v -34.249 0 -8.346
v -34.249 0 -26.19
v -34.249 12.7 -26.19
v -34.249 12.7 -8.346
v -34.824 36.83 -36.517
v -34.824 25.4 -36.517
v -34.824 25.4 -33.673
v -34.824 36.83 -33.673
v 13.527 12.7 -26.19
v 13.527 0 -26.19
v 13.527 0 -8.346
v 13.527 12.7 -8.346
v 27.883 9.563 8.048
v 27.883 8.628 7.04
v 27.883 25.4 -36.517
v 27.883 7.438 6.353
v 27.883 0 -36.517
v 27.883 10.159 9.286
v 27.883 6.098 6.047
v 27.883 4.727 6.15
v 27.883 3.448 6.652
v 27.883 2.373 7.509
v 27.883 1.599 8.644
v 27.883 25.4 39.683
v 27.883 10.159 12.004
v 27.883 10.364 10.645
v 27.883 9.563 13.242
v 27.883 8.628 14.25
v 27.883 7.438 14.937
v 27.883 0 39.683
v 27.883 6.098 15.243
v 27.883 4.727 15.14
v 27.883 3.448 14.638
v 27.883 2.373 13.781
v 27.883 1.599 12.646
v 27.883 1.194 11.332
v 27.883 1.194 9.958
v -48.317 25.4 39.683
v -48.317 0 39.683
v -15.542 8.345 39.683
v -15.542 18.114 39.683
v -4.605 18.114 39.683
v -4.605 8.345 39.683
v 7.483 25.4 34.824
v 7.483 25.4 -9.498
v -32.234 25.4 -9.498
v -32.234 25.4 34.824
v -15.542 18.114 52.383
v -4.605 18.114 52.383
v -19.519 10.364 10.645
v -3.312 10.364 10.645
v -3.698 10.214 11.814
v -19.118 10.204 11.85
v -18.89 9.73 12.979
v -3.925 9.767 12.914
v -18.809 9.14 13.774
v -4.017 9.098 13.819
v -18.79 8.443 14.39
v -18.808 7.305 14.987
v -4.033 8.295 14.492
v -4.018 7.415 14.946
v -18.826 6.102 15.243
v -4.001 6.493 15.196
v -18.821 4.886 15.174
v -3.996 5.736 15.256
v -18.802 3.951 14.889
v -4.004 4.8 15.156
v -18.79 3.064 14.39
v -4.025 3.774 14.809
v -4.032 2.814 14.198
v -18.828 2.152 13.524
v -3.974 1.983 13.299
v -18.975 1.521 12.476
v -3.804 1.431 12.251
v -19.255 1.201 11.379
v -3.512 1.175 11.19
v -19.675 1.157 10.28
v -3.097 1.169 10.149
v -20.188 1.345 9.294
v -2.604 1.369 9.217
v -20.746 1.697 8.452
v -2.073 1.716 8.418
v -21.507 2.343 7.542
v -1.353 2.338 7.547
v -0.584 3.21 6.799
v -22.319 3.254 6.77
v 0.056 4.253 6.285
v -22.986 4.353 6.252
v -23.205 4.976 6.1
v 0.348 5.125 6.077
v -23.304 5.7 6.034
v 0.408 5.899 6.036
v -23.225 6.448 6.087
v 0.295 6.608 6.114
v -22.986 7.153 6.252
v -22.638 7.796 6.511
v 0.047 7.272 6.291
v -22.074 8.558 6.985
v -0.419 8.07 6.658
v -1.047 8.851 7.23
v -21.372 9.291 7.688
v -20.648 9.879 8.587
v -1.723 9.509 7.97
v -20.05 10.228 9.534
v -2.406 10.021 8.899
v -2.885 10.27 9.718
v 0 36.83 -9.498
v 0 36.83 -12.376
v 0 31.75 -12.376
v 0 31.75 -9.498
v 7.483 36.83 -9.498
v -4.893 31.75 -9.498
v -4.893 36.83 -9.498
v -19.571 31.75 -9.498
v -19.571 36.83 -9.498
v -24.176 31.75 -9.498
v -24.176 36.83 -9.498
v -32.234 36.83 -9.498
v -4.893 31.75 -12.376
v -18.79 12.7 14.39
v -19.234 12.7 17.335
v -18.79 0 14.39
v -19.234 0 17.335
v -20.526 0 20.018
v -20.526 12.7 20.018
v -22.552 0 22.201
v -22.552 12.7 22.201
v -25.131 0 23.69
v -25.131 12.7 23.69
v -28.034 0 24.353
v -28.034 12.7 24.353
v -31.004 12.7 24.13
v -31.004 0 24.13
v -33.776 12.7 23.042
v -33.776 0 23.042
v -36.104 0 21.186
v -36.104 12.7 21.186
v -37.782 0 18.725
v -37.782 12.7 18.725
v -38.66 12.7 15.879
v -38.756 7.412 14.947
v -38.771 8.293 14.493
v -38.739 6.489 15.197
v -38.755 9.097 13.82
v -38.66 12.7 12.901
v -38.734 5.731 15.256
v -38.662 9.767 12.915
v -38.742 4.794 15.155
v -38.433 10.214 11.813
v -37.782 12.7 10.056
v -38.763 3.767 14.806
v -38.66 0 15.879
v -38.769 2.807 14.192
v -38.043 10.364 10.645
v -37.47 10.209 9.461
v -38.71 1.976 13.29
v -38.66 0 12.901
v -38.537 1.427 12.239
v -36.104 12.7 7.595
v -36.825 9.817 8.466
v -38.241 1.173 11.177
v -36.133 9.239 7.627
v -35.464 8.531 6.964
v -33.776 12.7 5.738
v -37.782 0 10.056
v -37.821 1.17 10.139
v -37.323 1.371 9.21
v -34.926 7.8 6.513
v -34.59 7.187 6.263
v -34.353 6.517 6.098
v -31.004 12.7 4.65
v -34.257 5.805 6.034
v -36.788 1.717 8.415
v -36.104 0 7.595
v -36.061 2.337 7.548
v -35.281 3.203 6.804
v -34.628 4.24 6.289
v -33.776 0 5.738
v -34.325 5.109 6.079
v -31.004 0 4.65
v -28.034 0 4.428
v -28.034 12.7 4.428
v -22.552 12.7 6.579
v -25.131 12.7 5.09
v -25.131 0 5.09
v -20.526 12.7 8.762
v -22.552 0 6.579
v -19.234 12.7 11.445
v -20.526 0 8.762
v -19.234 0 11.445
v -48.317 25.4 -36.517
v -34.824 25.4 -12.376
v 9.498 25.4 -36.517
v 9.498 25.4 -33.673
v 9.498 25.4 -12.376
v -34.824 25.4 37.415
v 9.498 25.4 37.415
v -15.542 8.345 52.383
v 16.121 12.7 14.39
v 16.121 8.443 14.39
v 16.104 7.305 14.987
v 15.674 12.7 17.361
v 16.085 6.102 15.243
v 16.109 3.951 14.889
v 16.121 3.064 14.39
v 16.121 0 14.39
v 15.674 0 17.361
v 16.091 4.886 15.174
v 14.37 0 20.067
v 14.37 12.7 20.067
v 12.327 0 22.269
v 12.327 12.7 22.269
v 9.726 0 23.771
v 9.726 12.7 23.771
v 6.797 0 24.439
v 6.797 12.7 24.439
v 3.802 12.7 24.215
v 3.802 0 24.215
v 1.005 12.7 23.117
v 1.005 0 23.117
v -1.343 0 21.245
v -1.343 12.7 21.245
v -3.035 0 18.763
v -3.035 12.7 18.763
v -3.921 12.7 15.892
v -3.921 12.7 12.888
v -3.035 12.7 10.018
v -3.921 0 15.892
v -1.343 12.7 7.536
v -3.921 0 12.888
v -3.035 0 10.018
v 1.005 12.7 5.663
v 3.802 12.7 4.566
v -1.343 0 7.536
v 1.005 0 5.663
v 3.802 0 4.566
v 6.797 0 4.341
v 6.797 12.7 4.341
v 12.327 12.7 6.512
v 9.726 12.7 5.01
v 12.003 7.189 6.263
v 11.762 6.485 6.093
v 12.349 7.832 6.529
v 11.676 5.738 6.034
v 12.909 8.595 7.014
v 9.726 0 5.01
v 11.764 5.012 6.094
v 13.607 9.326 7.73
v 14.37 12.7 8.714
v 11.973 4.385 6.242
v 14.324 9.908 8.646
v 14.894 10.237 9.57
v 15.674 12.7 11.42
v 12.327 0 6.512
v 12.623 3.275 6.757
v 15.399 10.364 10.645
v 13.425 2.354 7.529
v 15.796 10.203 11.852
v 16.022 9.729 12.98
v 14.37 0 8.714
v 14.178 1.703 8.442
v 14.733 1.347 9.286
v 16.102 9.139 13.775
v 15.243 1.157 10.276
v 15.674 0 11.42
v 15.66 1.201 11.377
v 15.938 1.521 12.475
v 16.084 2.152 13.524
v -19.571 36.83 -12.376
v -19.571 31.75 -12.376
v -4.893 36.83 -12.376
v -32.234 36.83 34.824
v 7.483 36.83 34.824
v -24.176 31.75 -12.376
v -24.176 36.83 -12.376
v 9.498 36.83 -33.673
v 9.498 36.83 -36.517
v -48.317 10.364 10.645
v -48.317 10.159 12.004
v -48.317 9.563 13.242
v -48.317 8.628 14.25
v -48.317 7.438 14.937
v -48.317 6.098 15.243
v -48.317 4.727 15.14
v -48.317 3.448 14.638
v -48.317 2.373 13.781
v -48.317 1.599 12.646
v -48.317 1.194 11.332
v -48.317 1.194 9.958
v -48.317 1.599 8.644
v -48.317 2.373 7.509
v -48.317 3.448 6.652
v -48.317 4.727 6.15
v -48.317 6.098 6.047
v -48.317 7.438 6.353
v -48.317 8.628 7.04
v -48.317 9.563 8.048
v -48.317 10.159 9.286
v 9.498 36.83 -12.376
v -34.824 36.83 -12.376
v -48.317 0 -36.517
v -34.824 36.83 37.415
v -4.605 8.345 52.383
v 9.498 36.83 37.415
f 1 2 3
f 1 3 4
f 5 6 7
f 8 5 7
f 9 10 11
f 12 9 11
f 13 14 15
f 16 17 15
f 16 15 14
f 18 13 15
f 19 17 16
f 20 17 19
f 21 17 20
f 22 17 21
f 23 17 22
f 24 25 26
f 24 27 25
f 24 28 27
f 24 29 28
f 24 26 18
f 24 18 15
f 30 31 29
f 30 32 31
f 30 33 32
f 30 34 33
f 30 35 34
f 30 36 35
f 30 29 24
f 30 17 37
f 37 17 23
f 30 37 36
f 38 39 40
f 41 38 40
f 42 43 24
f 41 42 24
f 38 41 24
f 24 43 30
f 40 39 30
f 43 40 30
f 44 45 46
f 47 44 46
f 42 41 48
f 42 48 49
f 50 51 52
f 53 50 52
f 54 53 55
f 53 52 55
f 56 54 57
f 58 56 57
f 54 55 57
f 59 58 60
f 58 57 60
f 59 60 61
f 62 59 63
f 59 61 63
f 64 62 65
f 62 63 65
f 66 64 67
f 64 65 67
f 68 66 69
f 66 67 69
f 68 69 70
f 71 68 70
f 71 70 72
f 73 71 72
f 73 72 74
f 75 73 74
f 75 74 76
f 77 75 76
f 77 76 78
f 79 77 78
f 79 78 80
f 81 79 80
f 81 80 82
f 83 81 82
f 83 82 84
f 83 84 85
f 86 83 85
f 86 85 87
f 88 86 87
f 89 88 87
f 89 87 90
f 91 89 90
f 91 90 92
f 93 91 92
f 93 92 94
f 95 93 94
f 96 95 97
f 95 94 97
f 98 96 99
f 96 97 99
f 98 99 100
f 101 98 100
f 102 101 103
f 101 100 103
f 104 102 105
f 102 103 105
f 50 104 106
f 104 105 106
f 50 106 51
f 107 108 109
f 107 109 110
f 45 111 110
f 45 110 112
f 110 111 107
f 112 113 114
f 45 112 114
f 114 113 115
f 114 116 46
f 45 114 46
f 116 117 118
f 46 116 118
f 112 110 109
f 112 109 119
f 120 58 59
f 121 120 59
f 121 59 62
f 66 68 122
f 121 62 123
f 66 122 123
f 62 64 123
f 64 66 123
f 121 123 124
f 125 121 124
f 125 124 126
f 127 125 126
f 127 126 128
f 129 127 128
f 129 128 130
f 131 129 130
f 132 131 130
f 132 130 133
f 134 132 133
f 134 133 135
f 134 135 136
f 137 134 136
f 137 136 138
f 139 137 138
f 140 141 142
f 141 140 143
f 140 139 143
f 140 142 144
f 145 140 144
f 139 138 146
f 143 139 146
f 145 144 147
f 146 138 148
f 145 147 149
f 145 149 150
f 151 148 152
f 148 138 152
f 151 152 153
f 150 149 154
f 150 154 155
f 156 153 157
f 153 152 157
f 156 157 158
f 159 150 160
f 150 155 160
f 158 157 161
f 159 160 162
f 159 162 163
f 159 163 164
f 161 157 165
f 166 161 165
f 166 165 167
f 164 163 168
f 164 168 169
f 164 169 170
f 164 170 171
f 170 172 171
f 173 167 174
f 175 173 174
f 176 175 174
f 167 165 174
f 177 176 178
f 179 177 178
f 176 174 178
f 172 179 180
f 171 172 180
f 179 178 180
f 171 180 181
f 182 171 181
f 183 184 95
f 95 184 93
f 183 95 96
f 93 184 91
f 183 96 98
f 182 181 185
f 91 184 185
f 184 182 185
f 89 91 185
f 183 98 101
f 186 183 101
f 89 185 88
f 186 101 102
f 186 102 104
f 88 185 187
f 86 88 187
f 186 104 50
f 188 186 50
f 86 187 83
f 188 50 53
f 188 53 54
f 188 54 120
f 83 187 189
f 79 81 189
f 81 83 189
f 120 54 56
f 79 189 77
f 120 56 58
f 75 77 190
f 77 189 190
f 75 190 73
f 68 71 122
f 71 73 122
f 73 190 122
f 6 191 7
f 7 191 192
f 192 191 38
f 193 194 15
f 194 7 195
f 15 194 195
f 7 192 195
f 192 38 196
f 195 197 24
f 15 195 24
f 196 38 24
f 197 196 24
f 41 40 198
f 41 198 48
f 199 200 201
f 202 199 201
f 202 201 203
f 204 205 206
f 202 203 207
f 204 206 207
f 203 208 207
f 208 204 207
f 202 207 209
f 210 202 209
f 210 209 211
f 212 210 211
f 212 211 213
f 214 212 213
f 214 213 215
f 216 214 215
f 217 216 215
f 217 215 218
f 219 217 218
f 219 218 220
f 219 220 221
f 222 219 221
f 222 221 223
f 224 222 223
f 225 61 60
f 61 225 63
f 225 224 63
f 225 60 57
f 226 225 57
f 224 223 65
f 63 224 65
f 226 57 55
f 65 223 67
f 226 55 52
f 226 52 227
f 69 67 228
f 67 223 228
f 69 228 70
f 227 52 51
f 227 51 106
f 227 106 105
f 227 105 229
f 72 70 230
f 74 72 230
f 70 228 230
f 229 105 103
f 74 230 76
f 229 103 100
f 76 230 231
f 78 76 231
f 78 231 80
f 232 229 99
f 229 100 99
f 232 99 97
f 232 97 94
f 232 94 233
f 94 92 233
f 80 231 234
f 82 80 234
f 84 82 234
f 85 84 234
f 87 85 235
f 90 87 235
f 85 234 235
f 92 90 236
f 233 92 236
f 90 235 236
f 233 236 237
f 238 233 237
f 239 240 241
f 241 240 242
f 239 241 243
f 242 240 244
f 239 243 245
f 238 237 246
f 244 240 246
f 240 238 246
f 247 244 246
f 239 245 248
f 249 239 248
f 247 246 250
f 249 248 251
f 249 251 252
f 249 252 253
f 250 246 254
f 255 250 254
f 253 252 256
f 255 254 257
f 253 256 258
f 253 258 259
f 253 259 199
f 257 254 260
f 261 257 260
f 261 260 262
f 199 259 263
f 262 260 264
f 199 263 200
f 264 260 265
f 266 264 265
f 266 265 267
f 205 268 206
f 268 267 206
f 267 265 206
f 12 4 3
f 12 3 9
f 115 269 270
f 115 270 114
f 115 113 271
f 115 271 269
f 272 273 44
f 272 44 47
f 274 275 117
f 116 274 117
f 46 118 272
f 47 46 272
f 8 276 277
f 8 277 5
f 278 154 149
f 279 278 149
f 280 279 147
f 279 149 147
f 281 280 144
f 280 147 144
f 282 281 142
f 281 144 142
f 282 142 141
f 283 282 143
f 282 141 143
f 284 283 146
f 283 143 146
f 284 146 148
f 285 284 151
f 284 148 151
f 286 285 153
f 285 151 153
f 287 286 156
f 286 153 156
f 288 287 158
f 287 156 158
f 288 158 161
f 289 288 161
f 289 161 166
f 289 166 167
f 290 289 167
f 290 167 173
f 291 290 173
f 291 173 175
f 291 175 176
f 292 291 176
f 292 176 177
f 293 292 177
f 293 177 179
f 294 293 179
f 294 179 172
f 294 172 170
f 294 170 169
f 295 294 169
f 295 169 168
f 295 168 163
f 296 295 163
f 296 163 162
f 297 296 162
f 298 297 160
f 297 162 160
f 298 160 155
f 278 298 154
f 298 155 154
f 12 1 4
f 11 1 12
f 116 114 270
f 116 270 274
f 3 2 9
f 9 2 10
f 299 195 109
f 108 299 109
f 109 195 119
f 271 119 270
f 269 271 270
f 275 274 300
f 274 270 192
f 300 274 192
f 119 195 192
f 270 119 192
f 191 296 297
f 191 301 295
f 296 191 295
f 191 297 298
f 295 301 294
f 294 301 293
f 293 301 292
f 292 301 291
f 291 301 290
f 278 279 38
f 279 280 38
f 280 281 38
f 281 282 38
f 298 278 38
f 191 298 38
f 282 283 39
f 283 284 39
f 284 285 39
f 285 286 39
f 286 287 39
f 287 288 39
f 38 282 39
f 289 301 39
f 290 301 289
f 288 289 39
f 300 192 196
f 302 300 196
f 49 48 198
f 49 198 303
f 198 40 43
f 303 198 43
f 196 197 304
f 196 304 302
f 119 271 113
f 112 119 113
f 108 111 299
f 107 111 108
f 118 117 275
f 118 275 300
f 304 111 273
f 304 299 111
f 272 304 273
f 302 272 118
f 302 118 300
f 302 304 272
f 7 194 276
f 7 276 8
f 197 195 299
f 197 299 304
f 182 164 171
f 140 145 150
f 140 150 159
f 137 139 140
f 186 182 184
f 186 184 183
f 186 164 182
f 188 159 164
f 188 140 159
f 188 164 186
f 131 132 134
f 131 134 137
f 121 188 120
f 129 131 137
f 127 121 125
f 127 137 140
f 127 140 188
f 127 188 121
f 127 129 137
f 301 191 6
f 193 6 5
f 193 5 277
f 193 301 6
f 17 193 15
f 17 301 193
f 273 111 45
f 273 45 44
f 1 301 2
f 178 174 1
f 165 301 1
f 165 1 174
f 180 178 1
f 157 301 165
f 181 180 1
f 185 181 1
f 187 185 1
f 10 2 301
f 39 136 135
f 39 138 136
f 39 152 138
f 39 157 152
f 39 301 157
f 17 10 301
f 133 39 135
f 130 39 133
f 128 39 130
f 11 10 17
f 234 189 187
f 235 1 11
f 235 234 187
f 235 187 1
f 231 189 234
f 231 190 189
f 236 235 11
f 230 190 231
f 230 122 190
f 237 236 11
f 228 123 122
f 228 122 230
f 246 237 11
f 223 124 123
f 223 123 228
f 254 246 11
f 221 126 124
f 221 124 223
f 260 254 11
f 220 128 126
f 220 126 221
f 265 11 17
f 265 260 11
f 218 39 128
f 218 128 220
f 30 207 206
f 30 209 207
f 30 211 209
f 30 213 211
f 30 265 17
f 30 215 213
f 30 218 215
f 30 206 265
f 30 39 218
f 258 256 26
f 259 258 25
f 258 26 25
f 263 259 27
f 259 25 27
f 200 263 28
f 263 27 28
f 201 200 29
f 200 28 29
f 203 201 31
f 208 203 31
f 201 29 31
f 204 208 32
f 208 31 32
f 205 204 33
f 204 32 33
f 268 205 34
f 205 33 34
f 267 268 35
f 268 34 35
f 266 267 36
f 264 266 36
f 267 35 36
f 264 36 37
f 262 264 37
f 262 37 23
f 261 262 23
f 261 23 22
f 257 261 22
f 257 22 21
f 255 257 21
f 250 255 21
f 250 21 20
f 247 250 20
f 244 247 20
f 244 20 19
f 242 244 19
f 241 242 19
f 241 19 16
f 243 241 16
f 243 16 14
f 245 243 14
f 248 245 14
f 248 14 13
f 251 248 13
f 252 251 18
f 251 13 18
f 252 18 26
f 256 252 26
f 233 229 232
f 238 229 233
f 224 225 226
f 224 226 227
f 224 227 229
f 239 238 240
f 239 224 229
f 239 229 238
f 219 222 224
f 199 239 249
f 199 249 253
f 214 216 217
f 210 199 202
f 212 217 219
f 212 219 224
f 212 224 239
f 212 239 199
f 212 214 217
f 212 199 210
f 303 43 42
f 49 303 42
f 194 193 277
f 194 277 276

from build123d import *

# Parameters (mm, degrees)
F0_W      = 76.2
F0_H      = 76.2
F1_DEPTH  = 25.4
F2_R      = 9.9906314399
F2_R_2    = 10.0773114698
F3_DEPTH  = 12.7
F4_W      = 47.7757537737
F4_H      = 17.8439570591
F5_DEPTH  = 12.7
F6_R      = 4.6109216101
F7_DEPTH  = 127
F8_W      = 44.3220883608
F8_H      = 49.7903954238
F9_DEPTH  = 11.43
F10_W     = 39.717190899
F10_H     = 44.3220883608
F11_DEPTH = 11.43
F12_W     = 44.3220883608
F12_H     = 2.8436683783
F13_DEPTH = 11.43
F14_W     = 4.6048909426
F14_H     = 2.8780568391
F14_W_2   = 4.8926984891
F15_DEPTH = 5.08
F16_W     = 10.9366197139
F16_H     = 9.7684562206
F17_DEPTH = 12.7


with BuildPart() as f1:
    # F0 (on Front) → F1 (new body)
    with BuildSketch(Plane.XZ):
        with Locations((-10.2171050385, 1.5830600848)):
            Rectangle(F0_W, F0_H)
    extrude(amount=-F1_DEPTH)

    # F2 (on face) → F3 (cut)
    with BuildSketch(Plane.XZ):
        with Locations((-28.7805758417, 14.3902888522)):
            Circle(F2_R)
        with Locations((6.0439212248, 14.3902888522)):
            Circle(F2_R_2)
    extrude(amount=-F3_DEPTH, mode=Mode.SUBTRACT)

    # F4 (on face) → F5 (cut)
    with BuildSketch(Plane.XZ):
        with Locations((-10.3610078804, -17.2683452256)):
            Rectangle(F4_W, F4_H)
    extrude(amount=-F5_DEPTH, mode=Mode.SUBTRACT)

    # F6 (on face) → F7 (cut)
    with BuildSketch(Plane.YZ.offset(27.8828949615)):
        with Locations((5.7532191277, 10.6449518353)):
            Circle(F6_R)
    extrude(amount=-F7_DEPTH, mode=Mode.SUBTRACT)

    # F8 (on face) → F9 (join)
    with BuildSketch(Plane(origin=(0, 25.4, 0), x_dir=(-1, 0, 0), z_dir=(0, 1, 0))):
        with Locations((12.6634538174, 12.5195505098)):
            Rectangle(F8_W, F8_H)
    extrude(amount=F9_DEPTH)

    # F10 (on face) → F11 (cut)
    with BuildSketch(Plane(origin=(0, 36.83, 0), x_dir=(-1, 0, 0), z_dir=(0, 1, 0))):
        with Locations((12.3756448738, 12.6634538174)):
            Rectangle(F10_W, F10_H)
    extrude(amount=-F11_DEPTH, mode=Mode.SUBTRACT)

    # F12 (on face) → F13 (join)
    with BuildSketch(Plane(origin=(0, 25.4, 0), x_dir=(-1, 0, 0), z_dir=(0, 1, 0))):
        with Locations((12.6634538174, -35.095105726)):
            Rectangle(F12_W, F12_H)
    extrude(amount=F13_DEPTH)

    # F14 (on face) → F15 (cut)
    with BuildSketch(Plane(origin=(0, 36.83, 0), x_dir=(-1, 0, 0), z_dir=(0, 1, 0))):
        with Locations((21.8732375652, -10.9366187826)):
            Rectangle(F14_W, F14_H)
        with Locations((2.4463492446, -10.9366187826)):
            Rectangle(F14_W_2, F14_H)
    extrude(amount=-F15_DEPTH, mode=Mode.SUBTRACT)

    # F16 (on face) → F17 (join)
    with BuildSketch(Plane.XY.offset(39.6830600848)):
        with Locations((-10.0732017308, 13.2293850183)):
            Rectangle(F16_W, F16_H)
    extrude(amount=F17_DEPTH)


solid = f1.part
